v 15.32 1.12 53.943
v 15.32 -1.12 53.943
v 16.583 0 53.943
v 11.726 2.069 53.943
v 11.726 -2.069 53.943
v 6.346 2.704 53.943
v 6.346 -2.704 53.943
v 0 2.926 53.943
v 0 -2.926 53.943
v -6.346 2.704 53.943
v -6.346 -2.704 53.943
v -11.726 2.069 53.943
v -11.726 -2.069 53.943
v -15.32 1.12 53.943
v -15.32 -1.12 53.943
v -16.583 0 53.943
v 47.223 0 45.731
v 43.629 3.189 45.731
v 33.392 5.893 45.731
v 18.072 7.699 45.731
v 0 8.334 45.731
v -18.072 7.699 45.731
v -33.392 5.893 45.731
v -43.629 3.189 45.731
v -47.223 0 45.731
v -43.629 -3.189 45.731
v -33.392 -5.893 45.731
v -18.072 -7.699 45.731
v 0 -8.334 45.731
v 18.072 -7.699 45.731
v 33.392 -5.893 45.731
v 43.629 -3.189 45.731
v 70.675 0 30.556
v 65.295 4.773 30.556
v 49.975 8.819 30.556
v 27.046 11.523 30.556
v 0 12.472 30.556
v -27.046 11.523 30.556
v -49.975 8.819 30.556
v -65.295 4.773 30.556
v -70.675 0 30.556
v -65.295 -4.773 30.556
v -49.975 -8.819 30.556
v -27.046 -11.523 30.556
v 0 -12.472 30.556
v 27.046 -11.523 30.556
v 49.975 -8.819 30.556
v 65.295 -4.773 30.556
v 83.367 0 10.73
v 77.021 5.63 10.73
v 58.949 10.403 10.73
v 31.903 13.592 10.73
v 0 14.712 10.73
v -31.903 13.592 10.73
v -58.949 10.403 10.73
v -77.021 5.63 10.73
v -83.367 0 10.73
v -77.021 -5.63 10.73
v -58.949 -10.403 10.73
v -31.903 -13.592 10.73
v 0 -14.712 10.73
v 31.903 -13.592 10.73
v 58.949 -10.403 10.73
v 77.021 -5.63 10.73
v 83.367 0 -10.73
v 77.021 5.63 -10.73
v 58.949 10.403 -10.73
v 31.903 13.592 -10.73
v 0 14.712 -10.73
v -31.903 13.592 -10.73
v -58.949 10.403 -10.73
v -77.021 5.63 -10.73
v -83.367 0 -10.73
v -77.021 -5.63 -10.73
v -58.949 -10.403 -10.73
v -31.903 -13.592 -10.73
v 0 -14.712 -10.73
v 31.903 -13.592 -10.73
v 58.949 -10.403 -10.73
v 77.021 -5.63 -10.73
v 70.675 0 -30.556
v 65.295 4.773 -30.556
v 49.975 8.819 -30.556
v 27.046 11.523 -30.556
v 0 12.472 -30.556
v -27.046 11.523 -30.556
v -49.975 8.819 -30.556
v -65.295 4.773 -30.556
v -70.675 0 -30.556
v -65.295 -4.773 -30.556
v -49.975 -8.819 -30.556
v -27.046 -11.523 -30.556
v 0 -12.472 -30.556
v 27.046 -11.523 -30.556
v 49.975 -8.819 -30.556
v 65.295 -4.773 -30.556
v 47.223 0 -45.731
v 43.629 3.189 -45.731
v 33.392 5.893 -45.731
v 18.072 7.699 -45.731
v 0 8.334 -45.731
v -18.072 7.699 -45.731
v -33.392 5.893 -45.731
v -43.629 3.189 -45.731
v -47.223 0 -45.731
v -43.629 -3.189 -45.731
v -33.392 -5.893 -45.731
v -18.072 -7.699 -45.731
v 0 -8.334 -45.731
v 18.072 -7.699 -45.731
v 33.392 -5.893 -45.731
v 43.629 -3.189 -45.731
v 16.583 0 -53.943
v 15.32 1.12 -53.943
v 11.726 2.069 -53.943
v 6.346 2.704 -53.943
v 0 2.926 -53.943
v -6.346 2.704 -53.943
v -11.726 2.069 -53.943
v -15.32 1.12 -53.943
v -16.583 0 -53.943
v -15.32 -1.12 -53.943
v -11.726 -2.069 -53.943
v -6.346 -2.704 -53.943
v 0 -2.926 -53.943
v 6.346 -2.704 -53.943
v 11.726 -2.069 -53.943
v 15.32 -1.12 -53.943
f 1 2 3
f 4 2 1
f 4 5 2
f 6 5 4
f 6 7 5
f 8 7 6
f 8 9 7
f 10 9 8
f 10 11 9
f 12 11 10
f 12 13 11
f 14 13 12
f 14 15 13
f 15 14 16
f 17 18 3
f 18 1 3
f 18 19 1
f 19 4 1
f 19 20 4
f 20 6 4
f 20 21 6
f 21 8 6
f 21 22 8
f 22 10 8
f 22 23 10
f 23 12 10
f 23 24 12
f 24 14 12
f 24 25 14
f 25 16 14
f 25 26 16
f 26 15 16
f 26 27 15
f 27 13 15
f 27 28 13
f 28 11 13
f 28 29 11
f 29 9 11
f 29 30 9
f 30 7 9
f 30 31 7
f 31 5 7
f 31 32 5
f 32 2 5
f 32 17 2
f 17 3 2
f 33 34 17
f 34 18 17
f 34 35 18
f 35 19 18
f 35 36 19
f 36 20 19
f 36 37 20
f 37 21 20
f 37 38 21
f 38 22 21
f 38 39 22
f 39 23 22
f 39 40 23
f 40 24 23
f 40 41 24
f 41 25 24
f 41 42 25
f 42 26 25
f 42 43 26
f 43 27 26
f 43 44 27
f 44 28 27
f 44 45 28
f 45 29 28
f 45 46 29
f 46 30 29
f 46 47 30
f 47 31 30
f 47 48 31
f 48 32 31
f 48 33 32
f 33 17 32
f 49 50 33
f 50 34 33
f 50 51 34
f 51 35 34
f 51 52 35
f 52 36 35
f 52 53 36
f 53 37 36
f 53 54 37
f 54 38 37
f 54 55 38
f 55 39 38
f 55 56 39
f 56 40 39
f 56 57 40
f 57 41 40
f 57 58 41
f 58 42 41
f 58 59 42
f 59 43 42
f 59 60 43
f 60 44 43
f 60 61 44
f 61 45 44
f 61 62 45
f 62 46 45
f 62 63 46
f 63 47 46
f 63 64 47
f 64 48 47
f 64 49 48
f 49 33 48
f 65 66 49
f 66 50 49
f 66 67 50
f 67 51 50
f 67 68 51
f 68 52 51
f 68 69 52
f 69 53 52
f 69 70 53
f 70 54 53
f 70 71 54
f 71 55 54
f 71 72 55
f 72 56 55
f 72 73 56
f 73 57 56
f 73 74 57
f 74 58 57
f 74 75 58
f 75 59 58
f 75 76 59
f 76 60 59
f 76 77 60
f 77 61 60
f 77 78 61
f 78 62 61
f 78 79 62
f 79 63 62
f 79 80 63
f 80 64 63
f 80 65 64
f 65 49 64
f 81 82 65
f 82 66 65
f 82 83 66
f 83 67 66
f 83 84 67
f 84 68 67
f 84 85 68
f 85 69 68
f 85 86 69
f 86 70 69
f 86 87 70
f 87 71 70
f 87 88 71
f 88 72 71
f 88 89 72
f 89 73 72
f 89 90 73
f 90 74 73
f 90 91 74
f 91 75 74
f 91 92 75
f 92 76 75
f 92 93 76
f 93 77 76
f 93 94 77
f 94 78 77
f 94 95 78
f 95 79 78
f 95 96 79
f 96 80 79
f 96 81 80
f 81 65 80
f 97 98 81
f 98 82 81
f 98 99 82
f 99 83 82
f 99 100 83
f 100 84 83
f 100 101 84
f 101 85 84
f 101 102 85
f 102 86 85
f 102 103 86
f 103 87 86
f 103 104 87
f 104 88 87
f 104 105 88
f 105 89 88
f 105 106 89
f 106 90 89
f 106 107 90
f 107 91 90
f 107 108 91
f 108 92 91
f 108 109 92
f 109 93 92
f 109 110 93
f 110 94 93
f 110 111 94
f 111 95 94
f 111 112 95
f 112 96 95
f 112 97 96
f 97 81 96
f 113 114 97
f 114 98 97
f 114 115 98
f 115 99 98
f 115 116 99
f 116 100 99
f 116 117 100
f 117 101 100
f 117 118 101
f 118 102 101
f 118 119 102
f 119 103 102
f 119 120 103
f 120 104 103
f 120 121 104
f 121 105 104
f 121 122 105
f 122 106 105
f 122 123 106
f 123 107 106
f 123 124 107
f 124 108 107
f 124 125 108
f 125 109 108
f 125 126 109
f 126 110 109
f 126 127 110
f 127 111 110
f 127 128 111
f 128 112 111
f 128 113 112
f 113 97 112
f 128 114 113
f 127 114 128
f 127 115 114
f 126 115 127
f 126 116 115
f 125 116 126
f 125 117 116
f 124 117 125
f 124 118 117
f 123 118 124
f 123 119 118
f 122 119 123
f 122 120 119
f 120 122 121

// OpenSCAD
// Generated by SolidPython 1.0.1 on 2020-07-29 00:46:52


scale(v = [17, 3, 11]) {
	sphere(r = 5);
}
/***********************************************
*********      SolidPython code:      **********
************************************************
 
# import packages: SolidPython
from solid import *
from solid.utils import *
from itertools import chain, combinations, permutations


class Resize:

    def __init__(self, scad_file):
        self.scad_file = scad_file
        #self.scad_file = import_scad(scad_file)
        # cone/cylinder param:
        self.r1 = 0
        self.r2 = 0
        self.h = 0
        # rectangular prism param:
        self.w = 0
        self.l = 0
        # ellipse param:
        self.r = 0

    # import OpenScad code (file name corresponds to shape)


    # classify shape + parameters
    def assign(self, param1, param2, param3):
        if self.scad_file == 'cone.scad':
            self.r1 = param1
            self.r2 = param2
            self.h = param3
        elif self.scad_file == 'cylinder.scad':
            self.r1 = param1
            self.r2 = param2
            self.h = param3
        elif self.scad_file == 'rectangularPrism.scad':
            self.h = param1
            self.l = param2
            self.w = param3
        else:
            self.r = param1
            self.h = param2

    # resize parameters
    def iterate(self):
        x = range(3, 20, 2)
        i = 1
        if self.scad_file == 'cone.scad':
            tempList = list(permutations(x, 2))
            for temp in tempList:
                param1 = temp[0]
                param2 = temp[1]
                filepath = 'produced_scad_files/' + 'cone' + str(param1) + '_' + str(param2) + '_' + '.scad'
                scad_render_to_file(cylinder(h=param1, r1=param2, r2=0), filepath)

        elif self.scad_file == 'cylinder.scad':
            tempList = list(permutations(x, 3))
            for temp in tempList:
                param1 = temp[0]
                param2 = temp[1]
                filepath = 'produced_scad_files/' + 'cylinder' + str(param1) + '_' + str(param2) + '_' + '.scad'
                scad_render_to_file(cylinder(h=param1, r1=param2, r2=param2), filepath)

        elif self.scad_file == 'rectangularPrism.scad':
            tempList = list(permutations(x, 3))
            for temp in tempList:
                param1 = temp[0]
                param2 = temp[1]
                param3 = temp[2]
                filepath = 'produced_scad_files/' + 'rectangularPrism' + str(param1) + '_' + str(param2) + '_' + str(
                    param3) + '.scad'
                scad_render_to_file(cube(size=(param1, param2, param3)), filepath)

        elif self.scad_file == 'ellipse.scad':
            tempList = list(permutations(x, 4))
            for temp in tempList:
                param1 = temp[0]
                param2 = temp[1]
                param3 = temp[2]
                param4 = temp[3]
                filepath = 'produced_scad_files/' + 'ellipse' + str(param1) + '_' + str(param2) + '_' + str(param3) + '_' + str(param4) + '.scad'
                scad_render_to_file(scale([param1, param2, param3])(sphere(r=param4)), filepath)

    def render_to_scadfile(self):
        scad_render_to_file(scad, 'example.scad') 
 
************************************************/
